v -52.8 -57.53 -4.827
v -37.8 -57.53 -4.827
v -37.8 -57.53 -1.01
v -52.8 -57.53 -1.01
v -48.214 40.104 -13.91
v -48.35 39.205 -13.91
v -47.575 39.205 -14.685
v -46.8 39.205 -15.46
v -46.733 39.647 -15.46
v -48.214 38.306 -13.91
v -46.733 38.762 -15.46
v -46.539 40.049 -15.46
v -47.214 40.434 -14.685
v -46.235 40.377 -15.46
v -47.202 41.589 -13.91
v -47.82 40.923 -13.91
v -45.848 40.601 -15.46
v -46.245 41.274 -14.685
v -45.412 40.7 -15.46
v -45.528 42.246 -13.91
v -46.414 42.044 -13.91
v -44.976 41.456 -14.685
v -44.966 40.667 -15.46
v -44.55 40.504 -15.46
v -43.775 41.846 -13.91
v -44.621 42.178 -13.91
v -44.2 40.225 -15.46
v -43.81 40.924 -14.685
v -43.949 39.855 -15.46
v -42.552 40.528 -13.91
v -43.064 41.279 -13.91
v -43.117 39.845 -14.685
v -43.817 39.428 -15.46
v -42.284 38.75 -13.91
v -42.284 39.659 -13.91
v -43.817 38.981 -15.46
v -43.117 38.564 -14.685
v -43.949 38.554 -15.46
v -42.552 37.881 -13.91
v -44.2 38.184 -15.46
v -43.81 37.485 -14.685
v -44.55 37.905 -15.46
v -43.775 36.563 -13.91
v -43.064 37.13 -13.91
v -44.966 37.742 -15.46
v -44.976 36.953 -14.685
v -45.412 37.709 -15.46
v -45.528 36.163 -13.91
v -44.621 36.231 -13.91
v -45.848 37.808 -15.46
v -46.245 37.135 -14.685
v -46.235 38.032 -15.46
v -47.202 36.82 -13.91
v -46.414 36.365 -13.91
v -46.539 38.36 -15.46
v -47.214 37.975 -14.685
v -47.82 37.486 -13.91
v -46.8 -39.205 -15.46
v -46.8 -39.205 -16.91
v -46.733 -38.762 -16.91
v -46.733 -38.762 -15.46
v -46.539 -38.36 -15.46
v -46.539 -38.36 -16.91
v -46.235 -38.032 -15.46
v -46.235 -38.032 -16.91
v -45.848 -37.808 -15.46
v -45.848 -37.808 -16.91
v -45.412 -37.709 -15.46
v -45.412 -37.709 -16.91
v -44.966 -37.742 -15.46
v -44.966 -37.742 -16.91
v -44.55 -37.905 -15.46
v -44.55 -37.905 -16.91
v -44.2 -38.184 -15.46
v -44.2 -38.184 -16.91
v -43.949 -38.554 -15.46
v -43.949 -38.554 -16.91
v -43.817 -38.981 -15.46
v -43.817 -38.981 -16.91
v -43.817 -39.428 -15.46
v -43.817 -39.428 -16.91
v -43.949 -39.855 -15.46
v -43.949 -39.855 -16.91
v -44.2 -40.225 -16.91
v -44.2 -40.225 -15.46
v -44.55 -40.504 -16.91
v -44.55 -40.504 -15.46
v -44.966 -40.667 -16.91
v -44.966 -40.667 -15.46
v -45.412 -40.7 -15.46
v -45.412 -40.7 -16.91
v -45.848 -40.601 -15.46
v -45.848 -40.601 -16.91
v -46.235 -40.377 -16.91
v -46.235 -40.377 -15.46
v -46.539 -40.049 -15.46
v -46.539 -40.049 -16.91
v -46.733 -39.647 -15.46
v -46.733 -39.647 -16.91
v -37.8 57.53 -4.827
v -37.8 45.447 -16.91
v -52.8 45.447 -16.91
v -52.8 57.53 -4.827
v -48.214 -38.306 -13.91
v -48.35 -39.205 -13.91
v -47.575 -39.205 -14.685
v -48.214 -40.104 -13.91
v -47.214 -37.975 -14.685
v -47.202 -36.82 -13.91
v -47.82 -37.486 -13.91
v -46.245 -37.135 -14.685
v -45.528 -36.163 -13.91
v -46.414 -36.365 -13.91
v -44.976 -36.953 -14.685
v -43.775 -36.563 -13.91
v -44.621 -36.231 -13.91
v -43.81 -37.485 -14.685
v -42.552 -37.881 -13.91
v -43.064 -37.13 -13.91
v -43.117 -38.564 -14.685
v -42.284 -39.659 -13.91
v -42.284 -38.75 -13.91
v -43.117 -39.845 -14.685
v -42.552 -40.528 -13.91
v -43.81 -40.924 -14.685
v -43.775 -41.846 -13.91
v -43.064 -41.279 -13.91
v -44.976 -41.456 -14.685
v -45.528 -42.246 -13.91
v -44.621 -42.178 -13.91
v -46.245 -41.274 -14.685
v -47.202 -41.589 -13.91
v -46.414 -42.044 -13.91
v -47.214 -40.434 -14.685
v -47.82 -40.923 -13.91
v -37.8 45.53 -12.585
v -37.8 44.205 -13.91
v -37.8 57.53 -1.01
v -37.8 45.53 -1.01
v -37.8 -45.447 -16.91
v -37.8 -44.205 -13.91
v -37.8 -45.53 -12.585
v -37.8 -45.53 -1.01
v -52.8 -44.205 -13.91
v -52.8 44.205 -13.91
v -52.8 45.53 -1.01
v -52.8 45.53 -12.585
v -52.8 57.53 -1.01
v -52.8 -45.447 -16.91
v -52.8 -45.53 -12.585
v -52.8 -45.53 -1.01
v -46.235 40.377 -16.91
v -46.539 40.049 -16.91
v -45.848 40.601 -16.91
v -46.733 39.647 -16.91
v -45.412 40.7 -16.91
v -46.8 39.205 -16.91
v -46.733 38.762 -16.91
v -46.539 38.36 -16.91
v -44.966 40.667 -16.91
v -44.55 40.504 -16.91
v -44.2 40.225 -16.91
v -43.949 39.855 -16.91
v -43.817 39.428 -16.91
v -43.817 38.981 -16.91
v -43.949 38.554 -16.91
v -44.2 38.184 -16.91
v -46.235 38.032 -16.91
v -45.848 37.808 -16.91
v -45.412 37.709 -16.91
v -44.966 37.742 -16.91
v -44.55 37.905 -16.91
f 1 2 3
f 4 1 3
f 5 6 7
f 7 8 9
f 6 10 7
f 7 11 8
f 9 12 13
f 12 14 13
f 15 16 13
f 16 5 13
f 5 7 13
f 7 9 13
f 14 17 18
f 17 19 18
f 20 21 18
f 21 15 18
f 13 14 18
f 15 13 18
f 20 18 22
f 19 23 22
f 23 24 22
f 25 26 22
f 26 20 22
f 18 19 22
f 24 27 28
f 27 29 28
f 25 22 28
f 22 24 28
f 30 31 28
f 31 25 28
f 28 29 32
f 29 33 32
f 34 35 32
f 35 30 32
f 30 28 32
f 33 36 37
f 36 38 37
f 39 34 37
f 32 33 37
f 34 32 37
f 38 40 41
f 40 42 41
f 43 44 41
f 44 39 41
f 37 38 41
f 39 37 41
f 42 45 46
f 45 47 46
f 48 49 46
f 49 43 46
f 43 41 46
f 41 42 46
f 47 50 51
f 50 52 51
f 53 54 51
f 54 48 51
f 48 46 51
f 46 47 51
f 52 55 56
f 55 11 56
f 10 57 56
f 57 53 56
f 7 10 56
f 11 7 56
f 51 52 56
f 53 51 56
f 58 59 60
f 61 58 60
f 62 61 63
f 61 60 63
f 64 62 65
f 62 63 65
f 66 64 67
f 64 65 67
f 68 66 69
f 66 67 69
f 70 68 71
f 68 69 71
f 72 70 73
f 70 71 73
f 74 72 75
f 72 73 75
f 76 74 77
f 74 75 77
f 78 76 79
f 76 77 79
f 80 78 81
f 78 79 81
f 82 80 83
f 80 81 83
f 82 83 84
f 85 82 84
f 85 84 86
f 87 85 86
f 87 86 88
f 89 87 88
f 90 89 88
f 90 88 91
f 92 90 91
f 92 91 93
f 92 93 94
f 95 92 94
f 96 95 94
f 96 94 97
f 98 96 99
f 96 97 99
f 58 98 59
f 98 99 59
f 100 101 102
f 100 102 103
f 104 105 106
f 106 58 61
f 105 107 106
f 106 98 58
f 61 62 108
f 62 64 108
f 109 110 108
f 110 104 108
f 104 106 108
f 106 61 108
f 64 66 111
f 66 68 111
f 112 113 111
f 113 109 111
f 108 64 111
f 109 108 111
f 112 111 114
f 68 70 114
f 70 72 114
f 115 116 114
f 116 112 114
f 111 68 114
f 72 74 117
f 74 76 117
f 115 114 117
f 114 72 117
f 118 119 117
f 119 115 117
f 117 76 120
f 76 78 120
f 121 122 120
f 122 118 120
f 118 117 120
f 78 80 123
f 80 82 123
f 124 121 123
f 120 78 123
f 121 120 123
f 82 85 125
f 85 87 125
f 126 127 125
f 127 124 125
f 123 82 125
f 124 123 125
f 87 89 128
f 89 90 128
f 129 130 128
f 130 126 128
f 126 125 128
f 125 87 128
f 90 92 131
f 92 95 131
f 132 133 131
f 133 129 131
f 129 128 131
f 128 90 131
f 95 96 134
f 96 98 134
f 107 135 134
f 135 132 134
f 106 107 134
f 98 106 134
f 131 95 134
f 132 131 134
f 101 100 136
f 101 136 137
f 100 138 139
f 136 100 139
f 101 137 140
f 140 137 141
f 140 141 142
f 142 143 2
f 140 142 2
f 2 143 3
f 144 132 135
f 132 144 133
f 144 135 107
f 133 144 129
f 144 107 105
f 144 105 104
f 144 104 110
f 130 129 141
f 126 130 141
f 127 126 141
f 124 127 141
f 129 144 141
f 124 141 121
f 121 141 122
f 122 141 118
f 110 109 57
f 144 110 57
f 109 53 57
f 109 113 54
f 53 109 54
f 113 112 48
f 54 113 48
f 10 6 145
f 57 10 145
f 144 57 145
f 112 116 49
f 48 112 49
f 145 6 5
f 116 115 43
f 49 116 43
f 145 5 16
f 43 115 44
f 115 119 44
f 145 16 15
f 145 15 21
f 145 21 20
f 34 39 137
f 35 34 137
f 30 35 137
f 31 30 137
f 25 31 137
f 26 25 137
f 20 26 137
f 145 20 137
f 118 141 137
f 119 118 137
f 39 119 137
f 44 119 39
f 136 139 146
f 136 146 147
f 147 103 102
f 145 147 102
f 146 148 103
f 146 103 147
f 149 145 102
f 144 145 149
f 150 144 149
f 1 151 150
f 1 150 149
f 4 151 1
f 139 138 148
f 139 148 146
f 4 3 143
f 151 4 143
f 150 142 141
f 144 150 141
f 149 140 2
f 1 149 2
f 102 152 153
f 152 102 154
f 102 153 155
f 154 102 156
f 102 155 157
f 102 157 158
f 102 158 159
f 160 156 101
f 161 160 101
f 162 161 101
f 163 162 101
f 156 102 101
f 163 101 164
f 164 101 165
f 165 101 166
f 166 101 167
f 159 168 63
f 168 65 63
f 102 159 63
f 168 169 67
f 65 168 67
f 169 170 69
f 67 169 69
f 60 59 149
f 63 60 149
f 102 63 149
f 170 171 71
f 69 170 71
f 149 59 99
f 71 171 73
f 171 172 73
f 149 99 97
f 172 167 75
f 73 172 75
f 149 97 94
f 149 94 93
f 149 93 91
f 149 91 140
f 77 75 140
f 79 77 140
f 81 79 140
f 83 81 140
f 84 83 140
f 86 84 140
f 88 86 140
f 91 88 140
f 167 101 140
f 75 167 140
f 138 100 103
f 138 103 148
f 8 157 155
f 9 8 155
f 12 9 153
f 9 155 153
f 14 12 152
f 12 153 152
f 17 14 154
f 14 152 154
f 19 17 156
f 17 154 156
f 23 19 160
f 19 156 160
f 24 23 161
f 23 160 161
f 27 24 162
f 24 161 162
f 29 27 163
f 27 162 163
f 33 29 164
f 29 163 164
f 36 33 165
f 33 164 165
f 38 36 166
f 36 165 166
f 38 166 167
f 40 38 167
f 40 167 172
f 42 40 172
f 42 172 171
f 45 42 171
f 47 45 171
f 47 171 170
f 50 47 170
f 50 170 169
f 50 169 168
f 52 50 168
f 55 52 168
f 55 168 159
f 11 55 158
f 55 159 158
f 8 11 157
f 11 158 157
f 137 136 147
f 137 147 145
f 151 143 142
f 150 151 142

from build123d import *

# Parameters (mm, degrees)
PAD005_DEPTH        = 15
HOLE001_D           = 3
HOLE001_DEPTH       = 25
HOLE001_CSINK_D     = 6.1
HOLE001_CSINK_ANGLE = 90
HOLE_D              = 3
HOLE_DEPTH          = 25
HOLE_CSINK_D        = 6.1
HOLE_CSINK_ANGLE    = 90


with BuildPart() as part:
    # Sketch005 (on Face53 of Binder002) → Pad005 (new body)
    with BuildSketch(Plane(origin=(87.2, 0, 0), x_dir=(0, -1, 0), z_dir=(-1, 0, 0))):
        Polygon((-57.53, -4.827157), (-57.53, -1.01), (-45.53, -1.01), (-45.53, -12.584517), (-44.204517, -13.91), (0, -13.91), (0, -16.91), (-45.447157, -16.91), align=None)
    pad005 = extrude(amount=PAD005_DEPTH)

    # Mirrored: Pad005 across Sketch005 V_Axis
    add(pad005.mirror(Plane(origin=(87.2, 0, 0), x_dir=(-1, 0, 0), z_dir=(0, -1, 0))))

    # Hole001
    with Locations(Plane.XY.offset(-13.91)):
        with Locations((79.7, 39.204517), (79.7, -39.204517)):
            CounterSinkHole(HOLE001_D / 2, HOLE001_CSINK_D / 2, depth=HOLE001_DEPTH, counter_sink_angle=HOLE001_CSINK_ANGLE)

    # Hole
    with Locations(Plane.XY.offset(-13.91)):
        with Locations((79.7, 39.204517), (79.7, -39.204517)):
            CounterSinkHole(HOLE_D / 2, HOLE_CSINK_D / 2, depth=HOLE_DEPTH, counter_sink_angle=HOLE_CSINK_ANGLE)


with BuildPart() as part_1:
    # Body003 placement: moved
    add(part.part.moved(Location((-125, 0, 0))))


solid = part_1.part
